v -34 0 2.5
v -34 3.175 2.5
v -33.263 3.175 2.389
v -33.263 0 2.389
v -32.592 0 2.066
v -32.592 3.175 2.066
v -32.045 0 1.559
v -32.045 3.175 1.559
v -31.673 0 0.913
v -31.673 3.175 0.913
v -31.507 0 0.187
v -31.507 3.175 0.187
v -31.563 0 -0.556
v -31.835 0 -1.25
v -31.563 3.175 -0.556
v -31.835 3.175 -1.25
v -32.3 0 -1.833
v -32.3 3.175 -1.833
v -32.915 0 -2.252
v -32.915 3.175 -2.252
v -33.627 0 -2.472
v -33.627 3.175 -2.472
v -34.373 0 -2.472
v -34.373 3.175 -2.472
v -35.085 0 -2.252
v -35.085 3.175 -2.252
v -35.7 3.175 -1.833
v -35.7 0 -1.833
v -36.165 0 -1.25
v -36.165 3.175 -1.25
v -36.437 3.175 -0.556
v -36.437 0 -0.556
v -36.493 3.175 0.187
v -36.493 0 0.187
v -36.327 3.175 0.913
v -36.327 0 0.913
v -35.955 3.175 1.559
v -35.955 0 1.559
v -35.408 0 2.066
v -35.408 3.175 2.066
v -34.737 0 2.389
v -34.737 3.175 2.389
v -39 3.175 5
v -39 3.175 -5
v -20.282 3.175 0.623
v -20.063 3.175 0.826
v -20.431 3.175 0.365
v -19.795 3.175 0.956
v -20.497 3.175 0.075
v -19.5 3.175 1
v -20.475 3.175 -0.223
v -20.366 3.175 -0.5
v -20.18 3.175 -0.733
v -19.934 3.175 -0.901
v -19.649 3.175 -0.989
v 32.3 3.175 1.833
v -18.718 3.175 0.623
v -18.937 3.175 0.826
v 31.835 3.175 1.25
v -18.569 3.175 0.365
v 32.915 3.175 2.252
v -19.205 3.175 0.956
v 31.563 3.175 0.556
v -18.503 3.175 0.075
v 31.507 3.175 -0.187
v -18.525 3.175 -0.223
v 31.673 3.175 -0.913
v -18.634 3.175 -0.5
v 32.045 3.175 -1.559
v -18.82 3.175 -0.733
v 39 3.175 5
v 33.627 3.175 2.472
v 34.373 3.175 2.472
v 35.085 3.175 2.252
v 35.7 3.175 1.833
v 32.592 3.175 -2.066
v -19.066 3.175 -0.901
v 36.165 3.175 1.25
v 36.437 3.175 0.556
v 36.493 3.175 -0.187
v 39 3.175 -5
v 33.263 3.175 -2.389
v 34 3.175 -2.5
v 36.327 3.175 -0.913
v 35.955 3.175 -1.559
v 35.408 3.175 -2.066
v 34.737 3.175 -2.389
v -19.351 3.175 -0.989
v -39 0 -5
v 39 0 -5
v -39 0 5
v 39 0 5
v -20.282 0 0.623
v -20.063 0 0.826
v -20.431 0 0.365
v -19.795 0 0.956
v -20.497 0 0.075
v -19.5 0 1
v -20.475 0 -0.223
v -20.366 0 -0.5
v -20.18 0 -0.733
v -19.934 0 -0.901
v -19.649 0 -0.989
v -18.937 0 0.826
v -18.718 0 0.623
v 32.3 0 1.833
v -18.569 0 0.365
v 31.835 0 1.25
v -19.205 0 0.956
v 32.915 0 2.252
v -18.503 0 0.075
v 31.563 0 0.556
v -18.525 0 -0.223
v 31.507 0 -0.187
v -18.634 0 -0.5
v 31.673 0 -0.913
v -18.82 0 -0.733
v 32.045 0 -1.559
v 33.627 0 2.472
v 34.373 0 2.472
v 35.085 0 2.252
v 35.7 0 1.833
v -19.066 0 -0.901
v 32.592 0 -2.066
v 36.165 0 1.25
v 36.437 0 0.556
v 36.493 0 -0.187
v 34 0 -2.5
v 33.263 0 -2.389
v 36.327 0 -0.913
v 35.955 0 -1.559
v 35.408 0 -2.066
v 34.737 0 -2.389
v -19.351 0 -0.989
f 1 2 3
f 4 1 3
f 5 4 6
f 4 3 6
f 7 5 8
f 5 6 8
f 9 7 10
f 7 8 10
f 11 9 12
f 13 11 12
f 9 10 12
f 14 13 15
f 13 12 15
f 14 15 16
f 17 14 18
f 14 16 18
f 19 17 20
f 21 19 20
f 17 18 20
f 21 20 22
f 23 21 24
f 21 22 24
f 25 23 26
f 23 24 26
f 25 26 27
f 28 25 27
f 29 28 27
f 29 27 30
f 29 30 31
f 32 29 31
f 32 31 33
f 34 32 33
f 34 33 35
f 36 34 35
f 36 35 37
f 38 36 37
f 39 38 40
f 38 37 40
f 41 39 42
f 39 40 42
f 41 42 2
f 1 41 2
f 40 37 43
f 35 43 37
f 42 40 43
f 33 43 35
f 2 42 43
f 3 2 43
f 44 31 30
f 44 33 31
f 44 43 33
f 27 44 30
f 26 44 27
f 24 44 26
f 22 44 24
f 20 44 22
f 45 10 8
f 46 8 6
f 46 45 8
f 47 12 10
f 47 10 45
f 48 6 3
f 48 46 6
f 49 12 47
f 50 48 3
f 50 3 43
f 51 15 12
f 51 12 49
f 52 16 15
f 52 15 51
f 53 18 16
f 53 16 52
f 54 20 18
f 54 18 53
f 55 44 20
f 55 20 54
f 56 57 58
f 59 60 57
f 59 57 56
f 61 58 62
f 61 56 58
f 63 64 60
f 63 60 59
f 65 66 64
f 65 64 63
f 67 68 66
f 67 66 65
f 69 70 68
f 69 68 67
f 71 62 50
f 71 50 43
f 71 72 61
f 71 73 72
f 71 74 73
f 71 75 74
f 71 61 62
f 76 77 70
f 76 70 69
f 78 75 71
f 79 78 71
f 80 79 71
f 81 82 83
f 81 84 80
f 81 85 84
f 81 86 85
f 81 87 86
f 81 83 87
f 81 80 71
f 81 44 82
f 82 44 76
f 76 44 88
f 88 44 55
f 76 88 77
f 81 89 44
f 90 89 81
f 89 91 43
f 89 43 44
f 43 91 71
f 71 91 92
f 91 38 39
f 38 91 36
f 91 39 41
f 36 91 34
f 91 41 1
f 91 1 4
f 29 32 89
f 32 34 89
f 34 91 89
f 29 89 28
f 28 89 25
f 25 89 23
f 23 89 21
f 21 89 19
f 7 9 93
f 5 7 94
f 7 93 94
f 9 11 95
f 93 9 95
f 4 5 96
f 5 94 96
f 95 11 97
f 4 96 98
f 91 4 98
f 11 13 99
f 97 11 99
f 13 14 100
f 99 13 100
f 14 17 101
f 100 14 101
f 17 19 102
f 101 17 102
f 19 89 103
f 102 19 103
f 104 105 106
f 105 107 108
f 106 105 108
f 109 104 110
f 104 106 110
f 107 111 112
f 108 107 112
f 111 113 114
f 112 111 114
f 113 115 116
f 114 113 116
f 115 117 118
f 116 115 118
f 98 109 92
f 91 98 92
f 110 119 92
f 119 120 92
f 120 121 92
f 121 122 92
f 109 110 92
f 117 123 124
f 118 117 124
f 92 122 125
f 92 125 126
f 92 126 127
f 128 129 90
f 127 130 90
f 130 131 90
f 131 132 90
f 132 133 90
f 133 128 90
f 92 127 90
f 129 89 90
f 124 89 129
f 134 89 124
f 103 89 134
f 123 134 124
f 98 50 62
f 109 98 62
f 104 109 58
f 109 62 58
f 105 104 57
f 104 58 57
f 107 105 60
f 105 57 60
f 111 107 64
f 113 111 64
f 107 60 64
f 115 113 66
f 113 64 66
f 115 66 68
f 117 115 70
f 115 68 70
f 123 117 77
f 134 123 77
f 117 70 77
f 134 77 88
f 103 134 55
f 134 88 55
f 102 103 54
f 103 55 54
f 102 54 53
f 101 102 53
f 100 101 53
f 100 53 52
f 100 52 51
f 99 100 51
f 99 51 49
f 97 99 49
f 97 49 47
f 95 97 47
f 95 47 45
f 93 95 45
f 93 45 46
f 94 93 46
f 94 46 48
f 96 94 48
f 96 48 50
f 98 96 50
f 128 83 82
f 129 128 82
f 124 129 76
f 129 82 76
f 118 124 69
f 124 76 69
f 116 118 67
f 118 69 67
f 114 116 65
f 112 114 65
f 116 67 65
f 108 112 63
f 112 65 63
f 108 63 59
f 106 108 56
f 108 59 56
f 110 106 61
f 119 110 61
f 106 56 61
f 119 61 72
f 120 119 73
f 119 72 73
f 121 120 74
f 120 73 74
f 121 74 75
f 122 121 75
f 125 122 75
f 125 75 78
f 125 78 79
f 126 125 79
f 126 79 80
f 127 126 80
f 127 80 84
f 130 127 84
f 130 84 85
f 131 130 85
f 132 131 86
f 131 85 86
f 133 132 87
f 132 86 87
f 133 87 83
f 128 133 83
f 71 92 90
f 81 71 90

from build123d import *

# Parameters (mm, degrees)
SKETCH2_W           = 78
SKETCH2_H           = 10
BOSS_EXTRUDE1_DEPTH = 3.175
SKETCH3_R           = 2.5
CUT_EXTRUDE1_DEPTH  = 3.175
CUT_EXTRUDE2_REACH  = 41.447
SKETCH4_R           = 1


with BuildPart() as part:
    # Sketch2 → Boss-Extrude1 (new body)
    with BuildSketch(Plane(origin=(0, 0, 0), x_dir=(1, 0, 0), z_dir=(0, 1, 0))):
        Rectangle(SKETCH2_W, SKETCH2_H)
    extrude(amount=BOSS_EXTRUDE1_DEPTH)

    # Sketch3 → Cut-Extrude1 (cut)
    with BuildSketch(Plane(origin=(0, 3.175, 0), x_dir=(1, 0, 0), z_dir=(0, 1, 0))):
        with Locations(Location((-34, 0, 0), (0, 0, 270))):
            Circle(SKETCH3_R)
        with Locations(Location((34, 0, 0), (0, 0, 90))):
            Circle(SKETCH3_R)
    extrude(amount=-CUT_EXTRUDE1_DEPTH, mode=Mode.SUBTRACT)

    # Sketch4 → Cut-Extrude2 (cut, up to next)
    with BuildSketch(Plane(origin=(0, 3.175, 0), x_dir=(1, 0, 0), z_dir=(0, 1, 0)), mode=Mode.PRIVATE) as cut_extrude2_sk1:
        with Locations(Location((-19.5, 0, 0), (0, 0, 270))):
            Circle(SKETCH4_R)
    cut_extrude2_tool1 = extrude(cut_extrude2_sk1.sketch, amount=-CUT_EXTRUDE2_REACH, mode=Mode.PRIVATE) & part.part
    add(cut_extrude2_tool1.solids().sort_by_distance((-19.5, 3.175, 0))[0], mode=Mode.SUBTRACT)


solid = part.part
